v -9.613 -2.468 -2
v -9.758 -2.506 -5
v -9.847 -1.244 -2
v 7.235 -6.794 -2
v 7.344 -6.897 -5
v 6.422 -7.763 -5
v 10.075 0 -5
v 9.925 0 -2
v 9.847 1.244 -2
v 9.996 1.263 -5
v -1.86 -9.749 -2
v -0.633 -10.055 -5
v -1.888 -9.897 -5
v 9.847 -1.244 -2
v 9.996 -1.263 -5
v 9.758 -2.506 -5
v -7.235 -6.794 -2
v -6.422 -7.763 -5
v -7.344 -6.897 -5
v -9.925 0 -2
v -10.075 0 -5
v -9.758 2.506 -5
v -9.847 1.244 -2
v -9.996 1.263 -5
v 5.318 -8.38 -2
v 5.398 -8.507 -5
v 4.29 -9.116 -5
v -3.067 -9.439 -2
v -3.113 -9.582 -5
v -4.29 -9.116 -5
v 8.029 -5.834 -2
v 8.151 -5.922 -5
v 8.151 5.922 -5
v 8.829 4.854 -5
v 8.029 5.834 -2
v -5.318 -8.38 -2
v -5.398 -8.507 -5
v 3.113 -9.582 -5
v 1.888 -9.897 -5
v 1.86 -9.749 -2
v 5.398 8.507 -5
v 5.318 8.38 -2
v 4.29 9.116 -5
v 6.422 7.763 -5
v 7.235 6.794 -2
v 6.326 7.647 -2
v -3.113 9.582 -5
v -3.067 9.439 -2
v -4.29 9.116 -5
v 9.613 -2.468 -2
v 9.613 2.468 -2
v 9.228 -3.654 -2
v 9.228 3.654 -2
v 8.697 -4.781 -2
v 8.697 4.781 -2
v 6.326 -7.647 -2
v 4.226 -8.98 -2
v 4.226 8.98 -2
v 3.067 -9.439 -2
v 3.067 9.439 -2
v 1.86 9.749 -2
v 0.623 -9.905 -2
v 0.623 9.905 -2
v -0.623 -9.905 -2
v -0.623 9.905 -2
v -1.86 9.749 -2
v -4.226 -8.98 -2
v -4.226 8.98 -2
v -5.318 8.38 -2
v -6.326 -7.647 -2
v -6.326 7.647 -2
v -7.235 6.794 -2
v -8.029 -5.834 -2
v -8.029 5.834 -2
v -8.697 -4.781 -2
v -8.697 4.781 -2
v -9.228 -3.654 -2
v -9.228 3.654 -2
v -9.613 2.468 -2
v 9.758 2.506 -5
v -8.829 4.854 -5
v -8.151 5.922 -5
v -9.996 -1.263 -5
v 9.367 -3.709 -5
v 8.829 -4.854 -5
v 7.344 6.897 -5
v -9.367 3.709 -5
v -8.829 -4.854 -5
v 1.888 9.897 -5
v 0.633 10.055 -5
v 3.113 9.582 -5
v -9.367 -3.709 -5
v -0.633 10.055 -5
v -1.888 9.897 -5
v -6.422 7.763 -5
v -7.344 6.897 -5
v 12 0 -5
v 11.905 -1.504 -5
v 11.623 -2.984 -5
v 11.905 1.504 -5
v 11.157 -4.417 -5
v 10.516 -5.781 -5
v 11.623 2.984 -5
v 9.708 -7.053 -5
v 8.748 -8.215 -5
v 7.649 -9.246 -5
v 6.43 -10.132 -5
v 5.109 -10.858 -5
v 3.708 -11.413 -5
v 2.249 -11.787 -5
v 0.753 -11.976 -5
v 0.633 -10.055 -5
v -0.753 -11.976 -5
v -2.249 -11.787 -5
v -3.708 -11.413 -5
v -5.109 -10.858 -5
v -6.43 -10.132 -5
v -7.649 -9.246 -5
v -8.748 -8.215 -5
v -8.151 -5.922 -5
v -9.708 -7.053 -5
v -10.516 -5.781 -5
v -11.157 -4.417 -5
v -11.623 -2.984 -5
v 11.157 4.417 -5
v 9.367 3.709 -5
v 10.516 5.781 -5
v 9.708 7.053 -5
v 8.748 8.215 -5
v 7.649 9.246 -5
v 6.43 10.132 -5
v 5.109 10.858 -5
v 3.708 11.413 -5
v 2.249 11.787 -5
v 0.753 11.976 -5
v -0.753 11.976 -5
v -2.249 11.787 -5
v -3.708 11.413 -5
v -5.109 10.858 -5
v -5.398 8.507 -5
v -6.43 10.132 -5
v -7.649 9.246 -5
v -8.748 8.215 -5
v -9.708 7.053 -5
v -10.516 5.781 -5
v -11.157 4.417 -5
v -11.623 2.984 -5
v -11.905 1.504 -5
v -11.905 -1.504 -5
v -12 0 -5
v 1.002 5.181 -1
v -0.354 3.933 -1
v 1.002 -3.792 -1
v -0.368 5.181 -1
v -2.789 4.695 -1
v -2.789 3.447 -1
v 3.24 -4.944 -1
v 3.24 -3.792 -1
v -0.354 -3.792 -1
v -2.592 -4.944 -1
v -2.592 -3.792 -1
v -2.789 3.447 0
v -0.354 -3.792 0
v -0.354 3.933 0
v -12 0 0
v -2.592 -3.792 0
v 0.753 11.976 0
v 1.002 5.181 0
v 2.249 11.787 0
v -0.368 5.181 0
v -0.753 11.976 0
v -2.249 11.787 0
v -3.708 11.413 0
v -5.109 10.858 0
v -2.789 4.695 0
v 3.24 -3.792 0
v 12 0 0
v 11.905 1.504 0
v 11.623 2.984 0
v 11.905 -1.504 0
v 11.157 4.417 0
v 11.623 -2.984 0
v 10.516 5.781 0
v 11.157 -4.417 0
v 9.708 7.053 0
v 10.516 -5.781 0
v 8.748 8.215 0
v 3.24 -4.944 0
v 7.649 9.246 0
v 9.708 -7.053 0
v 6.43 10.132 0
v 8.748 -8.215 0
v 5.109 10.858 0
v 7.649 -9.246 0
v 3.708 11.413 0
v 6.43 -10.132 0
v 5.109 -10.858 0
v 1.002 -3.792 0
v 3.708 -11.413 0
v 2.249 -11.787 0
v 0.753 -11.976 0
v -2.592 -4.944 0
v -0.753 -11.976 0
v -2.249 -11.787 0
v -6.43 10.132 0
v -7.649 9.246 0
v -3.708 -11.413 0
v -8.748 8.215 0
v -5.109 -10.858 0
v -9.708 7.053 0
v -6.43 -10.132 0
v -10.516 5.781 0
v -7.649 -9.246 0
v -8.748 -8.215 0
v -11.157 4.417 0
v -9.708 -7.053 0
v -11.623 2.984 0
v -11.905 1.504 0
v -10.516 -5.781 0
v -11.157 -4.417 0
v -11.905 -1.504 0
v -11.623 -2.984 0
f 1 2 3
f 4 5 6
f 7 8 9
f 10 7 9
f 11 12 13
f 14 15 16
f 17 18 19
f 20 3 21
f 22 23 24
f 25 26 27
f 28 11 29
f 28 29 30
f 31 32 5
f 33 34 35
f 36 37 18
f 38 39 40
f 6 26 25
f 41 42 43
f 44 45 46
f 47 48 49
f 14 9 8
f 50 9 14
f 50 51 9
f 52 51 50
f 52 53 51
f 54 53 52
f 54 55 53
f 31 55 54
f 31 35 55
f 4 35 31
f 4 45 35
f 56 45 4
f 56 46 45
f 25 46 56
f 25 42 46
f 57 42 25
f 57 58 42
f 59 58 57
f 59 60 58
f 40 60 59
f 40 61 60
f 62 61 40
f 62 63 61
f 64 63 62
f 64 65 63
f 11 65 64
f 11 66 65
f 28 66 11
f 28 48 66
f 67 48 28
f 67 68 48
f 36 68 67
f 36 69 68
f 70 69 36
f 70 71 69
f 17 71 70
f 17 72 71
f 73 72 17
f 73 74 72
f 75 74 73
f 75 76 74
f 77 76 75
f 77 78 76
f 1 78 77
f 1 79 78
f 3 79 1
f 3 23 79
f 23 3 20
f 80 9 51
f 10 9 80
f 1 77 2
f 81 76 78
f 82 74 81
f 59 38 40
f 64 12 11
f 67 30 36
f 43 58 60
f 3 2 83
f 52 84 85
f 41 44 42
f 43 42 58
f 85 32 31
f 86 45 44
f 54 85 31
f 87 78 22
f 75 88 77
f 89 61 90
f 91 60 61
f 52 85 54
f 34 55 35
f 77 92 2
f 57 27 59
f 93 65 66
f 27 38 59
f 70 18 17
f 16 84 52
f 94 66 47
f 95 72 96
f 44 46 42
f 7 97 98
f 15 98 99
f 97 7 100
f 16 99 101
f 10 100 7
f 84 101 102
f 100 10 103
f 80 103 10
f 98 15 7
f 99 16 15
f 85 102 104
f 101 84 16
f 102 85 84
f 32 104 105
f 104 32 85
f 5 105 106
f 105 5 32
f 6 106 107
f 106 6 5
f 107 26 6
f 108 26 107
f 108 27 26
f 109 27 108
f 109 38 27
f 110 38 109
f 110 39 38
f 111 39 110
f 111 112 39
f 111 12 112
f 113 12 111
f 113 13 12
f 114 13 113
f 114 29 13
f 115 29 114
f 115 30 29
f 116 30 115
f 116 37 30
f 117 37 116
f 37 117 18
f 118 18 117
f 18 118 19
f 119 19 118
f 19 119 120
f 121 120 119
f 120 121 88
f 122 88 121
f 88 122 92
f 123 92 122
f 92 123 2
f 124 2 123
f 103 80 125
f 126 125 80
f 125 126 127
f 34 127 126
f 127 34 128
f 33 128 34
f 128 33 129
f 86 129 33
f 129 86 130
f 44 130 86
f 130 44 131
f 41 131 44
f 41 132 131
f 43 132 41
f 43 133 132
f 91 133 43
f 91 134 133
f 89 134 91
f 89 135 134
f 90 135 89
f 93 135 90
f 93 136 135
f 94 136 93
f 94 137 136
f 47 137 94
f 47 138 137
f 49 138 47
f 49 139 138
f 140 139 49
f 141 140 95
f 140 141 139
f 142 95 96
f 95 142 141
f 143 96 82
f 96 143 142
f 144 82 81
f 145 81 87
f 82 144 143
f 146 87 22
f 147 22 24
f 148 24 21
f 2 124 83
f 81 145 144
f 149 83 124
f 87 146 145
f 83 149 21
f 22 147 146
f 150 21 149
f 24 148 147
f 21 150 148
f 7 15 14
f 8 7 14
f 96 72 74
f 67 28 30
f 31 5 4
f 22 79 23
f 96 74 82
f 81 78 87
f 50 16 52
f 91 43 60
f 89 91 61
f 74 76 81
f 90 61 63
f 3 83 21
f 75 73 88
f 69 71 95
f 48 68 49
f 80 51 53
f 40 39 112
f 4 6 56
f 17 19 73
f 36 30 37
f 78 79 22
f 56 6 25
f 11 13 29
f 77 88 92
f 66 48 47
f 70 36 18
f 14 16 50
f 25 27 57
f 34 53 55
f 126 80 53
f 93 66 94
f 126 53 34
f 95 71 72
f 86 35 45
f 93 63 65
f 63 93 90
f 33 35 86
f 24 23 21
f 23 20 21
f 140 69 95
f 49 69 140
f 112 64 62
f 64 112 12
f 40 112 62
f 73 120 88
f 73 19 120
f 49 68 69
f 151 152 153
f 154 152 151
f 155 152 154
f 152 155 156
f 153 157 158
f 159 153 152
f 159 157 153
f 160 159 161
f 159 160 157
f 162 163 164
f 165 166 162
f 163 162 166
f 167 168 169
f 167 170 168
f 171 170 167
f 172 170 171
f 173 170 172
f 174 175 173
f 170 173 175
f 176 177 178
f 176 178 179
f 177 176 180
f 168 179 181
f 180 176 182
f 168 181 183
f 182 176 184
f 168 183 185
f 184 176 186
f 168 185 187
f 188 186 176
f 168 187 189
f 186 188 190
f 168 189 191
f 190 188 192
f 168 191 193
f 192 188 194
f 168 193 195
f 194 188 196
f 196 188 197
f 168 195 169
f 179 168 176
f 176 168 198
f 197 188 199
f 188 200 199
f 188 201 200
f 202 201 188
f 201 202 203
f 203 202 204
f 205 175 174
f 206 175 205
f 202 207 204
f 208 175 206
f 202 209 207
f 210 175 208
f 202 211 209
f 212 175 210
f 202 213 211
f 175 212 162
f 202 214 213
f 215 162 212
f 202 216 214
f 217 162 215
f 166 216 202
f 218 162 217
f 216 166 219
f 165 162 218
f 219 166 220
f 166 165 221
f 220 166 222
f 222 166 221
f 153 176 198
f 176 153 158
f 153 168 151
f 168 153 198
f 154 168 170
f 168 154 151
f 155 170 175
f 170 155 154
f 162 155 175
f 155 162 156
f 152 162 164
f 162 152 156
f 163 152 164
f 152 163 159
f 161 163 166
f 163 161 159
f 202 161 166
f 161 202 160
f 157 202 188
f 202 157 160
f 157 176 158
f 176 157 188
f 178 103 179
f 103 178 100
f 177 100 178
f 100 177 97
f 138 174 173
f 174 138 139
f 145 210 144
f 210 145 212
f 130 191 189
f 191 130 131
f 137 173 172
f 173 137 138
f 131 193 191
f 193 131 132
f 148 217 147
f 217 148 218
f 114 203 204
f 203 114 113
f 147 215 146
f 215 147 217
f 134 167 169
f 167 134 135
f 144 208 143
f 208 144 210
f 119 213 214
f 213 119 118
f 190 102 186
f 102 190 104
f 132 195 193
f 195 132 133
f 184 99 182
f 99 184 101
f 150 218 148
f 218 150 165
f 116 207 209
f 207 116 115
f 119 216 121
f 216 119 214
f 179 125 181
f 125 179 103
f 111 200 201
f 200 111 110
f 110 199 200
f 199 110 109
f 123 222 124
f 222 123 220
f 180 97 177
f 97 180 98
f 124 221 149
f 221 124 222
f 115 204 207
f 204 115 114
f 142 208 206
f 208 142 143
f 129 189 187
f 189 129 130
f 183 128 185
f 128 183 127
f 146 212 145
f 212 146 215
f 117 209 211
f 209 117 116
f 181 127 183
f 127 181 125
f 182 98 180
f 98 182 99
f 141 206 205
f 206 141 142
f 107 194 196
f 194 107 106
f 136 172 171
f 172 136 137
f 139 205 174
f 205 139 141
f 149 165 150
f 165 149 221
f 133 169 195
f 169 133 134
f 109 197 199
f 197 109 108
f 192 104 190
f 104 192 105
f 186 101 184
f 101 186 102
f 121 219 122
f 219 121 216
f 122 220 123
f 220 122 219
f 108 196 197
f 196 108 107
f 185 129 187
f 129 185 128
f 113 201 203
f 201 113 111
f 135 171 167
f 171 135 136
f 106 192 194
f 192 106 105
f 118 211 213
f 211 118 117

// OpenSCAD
$fn = 50;

difference() {
	union() {
		translate(v = [0, 0, -5.0]) {
			cylinder(h = 5, r = 12.0);
		}
	}
	union() {
		#translate(v = [0, 0, -5.0]) {
			cylinder(h = 3, r1 = 10.075, r2 = 9.925);
		}
		translate(v = [0, 0, -1]) {
			linear_extrude(height = 1) {
				text(font = "Impact", halign = "center", size = 10, text = "1", valign = "center");
			}
		}
	}
}
